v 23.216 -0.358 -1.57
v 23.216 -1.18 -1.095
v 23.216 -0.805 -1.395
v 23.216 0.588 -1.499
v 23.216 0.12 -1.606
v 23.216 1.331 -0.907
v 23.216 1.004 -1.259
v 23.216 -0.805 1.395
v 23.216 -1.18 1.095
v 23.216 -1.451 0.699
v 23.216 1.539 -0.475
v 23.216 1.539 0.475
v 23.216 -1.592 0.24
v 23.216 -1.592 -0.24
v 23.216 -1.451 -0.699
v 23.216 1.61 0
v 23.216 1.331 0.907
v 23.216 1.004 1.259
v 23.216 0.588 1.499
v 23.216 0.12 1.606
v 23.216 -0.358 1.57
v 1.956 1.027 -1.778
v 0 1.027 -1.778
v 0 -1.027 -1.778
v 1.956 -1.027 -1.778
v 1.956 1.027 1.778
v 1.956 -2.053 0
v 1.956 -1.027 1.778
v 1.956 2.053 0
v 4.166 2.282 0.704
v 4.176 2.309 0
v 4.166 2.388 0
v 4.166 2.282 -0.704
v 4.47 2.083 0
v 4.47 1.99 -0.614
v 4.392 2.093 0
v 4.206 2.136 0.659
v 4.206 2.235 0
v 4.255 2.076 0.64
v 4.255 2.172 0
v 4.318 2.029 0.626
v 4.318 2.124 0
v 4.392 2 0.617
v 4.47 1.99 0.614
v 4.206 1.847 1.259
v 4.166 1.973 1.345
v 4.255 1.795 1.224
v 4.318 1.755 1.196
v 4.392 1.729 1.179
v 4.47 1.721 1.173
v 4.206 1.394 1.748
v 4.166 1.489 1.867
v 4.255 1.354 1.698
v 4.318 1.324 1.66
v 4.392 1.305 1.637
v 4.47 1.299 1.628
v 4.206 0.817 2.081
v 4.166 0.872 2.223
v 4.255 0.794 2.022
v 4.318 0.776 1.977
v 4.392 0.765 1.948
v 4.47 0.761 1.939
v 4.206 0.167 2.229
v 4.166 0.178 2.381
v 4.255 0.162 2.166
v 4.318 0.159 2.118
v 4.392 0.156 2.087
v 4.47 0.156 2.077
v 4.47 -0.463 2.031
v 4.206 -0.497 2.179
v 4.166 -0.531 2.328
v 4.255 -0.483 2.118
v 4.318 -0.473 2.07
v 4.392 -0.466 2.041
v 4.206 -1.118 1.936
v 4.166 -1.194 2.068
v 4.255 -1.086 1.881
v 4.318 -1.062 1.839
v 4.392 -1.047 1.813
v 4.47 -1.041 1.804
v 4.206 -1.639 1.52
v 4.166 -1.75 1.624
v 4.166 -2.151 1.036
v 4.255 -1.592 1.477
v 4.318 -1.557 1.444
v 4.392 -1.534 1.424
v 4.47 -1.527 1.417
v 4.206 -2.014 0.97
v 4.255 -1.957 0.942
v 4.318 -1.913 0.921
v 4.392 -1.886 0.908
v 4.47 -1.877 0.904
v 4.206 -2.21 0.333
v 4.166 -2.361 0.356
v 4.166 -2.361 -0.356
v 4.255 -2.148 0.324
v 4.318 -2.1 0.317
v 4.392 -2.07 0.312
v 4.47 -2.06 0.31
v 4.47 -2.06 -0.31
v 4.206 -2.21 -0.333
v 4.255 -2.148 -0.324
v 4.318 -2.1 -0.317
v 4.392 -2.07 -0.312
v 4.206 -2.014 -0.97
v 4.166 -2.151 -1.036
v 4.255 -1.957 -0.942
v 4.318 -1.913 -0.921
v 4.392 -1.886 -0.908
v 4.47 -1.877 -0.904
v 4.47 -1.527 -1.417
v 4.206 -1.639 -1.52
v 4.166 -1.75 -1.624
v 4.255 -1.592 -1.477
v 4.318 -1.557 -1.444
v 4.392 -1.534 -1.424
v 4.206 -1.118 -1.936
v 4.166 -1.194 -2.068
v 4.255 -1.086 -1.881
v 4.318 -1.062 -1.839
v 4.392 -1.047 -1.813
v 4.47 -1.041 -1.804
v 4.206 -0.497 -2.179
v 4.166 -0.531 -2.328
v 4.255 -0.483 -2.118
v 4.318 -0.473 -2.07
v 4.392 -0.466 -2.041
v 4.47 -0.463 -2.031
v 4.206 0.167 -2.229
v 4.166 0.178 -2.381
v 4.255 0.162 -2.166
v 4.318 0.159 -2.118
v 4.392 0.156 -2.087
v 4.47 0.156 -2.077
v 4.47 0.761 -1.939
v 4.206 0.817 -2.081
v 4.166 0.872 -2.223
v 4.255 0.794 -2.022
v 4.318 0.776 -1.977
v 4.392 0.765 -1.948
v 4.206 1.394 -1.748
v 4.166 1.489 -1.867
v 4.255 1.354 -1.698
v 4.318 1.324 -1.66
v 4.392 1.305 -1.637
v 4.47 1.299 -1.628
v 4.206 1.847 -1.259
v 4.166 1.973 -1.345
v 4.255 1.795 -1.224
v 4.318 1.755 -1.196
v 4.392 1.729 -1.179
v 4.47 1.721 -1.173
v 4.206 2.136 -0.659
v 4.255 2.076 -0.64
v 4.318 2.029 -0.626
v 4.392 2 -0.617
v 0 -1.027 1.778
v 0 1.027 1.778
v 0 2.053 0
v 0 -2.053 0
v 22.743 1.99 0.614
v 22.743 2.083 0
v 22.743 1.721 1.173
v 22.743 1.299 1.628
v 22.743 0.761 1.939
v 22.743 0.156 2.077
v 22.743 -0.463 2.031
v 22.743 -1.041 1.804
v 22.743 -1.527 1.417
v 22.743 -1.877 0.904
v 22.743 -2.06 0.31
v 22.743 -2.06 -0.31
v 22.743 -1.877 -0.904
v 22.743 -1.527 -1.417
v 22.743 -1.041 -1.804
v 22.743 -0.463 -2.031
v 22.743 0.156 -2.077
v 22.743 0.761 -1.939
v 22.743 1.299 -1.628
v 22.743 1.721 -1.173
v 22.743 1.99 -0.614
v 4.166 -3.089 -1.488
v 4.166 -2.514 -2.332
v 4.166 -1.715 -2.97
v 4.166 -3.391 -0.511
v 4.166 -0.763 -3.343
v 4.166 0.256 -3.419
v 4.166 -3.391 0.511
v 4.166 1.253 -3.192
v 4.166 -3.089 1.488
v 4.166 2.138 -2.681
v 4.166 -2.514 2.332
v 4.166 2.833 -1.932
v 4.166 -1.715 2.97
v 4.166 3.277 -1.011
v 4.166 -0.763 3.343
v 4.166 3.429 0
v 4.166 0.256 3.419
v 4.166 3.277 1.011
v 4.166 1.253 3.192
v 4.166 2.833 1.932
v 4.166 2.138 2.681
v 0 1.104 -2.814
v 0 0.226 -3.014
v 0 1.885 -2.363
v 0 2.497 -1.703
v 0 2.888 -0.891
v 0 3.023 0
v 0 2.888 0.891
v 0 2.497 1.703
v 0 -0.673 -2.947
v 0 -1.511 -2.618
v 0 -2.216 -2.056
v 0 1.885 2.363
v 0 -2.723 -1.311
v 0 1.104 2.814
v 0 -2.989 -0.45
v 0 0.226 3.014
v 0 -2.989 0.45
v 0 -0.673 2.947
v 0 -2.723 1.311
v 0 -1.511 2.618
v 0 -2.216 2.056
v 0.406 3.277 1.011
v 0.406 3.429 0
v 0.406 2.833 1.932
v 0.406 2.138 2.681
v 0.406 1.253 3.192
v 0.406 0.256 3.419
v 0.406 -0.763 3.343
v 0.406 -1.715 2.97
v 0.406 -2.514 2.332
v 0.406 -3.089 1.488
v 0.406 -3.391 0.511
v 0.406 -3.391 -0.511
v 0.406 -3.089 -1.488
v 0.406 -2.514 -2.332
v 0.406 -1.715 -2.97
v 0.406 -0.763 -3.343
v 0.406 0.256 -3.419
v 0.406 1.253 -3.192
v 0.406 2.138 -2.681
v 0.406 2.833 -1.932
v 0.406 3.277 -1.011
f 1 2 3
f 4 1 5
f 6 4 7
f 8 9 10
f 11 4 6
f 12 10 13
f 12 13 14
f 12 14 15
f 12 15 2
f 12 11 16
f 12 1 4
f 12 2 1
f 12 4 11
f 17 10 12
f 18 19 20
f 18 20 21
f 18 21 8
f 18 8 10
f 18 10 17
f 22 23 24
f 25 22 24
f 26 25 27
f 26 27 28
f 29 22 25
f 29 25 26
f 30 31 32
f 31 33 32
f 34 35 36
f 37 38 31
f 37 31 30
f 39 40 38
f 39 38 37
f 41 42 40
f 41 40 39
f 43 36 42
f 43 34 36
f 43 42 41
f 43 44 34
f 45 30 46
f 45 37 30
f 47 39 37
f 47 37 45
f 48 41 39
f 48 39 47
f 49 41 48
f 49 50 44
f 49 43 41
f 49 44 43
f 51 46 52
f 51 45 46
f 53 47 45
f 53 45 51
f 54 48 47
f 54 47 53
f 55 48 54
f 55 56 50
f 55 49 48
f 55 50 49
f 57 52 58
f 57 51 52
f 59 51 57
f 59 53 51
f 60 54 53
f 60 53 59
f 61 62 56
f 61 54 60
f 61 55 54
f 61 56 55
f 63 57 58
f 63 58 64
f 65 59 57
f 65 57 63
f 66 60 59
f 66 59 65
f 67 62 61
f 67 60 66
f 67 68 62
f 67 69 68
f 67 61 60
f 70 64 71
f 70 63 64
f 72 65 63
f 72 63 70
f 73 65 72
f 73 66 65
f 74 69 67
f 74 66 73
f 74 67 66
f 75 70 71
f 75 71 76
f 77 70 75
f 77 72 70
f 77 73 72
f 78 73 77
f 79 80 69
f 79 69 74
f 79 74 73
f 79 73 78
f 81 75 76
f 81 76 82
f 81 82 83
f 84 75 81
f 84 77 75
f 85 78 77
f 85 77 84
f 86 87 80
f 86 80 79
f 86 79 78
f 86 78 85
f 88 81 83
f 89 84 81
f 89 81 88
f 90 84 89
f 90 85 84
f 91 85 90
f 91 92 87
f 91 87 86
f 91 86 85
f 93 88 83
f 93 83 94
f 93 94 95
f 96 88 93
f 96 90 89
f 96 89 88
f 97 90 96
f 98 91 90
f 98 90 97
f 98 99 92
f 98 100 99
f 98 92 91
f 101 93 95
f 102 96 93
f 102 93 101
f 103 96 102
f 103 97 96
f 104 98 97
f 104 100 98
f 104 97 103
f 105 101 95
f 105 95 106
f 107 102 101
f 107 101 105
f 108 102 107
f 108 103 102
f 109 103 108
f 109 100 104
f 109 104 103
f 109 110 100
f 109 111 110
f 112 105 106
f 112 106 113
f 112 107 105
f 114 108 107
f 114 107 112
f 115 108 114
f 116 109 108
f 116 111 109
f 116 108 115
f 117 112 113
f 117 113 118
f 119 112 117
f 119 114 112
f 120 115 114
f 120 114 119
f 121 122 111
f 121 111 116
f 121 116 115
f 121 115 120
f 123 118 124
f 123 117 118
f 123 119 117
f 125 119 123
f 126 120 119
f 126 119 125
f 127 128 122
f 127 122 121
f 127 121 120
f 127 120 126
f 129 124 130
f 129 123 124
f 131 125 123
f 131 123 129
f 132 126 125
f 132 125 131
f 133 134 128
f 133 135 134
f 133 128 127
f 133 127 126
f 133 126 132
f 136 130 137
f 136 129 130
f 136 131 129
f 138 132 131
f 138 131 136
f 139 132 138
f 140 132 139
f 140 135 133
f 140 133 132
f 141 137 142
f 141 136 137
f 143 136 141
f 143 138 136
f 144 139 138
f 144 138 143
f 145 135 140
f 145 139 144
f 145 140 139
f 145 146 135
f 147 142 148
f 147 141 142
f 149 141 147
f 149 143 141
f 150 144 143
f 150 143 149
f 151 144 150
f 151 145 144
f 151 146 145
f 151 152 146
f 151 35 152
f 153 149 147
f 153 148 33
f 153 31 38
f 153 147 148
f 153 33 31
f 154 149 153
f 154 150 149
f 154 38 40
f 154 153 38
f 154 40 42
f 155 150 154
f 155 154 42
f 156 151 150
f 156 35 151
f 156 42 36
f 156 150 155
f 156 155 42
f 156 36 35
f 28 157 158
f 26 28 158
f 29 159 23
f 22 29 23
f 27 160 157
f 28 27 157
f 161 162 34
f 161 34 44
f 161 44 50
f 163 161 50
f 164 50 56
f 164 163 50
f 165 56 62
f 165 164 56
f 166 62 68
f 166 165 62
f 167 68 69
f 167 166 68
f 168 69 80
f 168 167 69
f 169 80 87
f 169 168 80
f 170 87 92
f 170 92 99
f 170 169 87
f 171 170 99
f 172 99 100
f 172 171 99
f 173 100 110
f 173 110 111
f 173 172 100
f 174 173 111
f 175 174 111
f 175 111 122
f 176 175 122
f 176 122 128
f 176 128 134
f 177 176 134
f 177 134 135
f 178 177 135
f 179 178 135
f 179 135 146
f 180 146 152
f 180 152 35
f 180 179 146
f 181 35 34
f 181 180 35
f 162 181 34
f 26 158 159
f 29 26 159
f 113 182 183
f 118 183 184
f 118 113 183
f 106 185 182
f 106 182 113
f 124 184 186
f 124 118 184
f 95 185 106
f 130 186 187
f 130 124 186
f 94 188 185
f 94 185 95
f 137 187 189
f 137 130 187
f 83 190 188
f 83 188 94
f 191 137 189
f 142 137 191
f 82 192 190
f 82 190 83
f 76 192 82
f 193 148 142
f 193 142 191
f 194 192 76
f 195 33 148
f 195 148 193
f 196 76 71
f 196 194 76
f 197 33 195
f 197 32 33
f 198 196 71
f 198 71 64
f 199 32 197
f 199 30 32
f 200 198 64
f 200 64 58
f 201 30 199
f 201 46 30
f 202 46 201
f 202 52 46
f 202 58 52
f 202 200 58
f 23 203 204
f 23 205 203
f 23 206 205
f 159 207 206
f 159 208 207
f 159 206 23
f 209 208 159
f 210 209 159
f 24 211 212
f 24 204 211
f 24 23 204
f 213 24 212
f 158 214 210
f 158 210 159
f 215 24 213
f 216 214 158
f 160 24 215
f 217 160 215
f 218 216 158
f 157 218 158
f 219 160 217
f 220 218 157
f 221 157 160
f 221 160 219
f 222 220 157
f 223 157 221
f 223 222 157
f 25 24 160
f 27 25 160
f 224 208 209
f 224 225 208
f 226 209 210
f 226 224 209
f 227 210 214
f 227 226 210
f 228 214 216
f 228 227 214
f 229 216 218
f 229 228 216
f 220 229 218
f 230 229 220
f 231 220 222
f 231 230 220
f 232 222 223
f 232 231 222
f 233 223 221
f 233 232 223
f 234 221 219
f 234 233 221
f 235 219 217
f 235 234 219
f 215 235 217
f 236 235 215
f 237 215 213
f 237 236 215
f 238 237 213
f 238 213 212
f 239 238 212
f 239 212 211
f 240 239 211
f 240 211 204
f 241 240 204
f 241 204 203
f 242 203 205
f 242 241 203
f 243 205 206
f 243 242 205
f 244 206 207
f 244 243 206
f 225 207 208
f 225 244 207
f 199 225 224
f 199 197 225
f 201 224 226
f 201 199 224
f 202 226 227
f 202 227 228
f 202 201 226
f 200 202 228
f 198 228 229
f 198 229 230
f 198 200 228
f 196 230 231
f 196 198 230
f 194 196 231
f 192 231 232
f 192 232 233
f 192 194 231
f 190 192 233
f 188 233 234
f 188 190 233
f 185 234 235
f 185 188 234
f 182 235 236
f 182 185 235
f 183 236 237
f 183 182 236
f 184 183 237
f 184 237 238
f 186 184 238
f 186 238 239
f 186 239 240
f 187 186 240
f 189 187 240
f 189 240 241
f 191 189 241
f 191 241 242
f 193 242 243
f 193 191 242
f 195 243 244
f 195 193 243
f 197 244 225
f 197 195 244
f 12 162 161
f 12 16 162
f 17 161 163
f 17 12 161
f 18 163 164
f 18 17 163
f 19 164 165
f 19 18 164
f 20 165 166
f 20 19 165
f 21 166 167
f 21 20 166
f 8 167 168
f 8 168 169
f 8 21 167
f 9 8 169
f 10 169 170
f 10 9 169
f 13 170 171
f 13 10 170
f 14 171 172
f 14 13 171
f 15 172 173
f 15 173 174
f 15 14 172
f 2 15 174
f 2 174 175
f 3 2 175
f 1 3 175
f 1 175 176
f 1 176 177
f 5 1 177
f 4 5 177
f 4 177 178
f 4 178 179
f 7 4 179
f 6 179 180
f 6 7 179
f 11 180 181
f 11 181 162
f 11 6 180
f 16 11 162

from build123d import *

# Parameters (mm, degrees)
FILLET1_R   = 0.3048
HEX_2_DEPTH = 1.9558


with BuildPart() as part:
    # BodySke → Base-Revolve (revolve)
    with BuildSketch(Plane.XY):
        Polygon((0, 0), (0, 3.0226), (0.4064, 3.429), (4.1656, 3.429), (4.1656, 2.0828), (22.74316, 2.0828), (23.2156, 1.61036), (23.2156, 0), align=None)
    revolve(axis=Axis((-31.75, 0, 0), (1, 0, 0)))

    # Fillet1
    fillet1_edges = [part.edges().sort_by_distance(p)[0] for p in [
        (4.1656, -2.0828, 0),
    ]]
    fillet(fillet1_edges, radius=FILLET1_R)

    # Sketch3 → Hex 2 (cut)
    with BuildSketch(Plane(origin=(0, 0, 0), x_dir=(0, 0.500000000000001, 0.866025403784438), z_dir=(-1, 0, 0))):
        Polygon((1.026528779, 1.778), (-1.026528779, 1.778), (-2.053057557, 0), (-1.026528779, -1.778), (1.026528779, -1.778), (2.053057557, 0), align=None)
    extrude(amount=-HEX_2_DEPTH, mode=Mode.SUBTRACT)


solid = part.part
